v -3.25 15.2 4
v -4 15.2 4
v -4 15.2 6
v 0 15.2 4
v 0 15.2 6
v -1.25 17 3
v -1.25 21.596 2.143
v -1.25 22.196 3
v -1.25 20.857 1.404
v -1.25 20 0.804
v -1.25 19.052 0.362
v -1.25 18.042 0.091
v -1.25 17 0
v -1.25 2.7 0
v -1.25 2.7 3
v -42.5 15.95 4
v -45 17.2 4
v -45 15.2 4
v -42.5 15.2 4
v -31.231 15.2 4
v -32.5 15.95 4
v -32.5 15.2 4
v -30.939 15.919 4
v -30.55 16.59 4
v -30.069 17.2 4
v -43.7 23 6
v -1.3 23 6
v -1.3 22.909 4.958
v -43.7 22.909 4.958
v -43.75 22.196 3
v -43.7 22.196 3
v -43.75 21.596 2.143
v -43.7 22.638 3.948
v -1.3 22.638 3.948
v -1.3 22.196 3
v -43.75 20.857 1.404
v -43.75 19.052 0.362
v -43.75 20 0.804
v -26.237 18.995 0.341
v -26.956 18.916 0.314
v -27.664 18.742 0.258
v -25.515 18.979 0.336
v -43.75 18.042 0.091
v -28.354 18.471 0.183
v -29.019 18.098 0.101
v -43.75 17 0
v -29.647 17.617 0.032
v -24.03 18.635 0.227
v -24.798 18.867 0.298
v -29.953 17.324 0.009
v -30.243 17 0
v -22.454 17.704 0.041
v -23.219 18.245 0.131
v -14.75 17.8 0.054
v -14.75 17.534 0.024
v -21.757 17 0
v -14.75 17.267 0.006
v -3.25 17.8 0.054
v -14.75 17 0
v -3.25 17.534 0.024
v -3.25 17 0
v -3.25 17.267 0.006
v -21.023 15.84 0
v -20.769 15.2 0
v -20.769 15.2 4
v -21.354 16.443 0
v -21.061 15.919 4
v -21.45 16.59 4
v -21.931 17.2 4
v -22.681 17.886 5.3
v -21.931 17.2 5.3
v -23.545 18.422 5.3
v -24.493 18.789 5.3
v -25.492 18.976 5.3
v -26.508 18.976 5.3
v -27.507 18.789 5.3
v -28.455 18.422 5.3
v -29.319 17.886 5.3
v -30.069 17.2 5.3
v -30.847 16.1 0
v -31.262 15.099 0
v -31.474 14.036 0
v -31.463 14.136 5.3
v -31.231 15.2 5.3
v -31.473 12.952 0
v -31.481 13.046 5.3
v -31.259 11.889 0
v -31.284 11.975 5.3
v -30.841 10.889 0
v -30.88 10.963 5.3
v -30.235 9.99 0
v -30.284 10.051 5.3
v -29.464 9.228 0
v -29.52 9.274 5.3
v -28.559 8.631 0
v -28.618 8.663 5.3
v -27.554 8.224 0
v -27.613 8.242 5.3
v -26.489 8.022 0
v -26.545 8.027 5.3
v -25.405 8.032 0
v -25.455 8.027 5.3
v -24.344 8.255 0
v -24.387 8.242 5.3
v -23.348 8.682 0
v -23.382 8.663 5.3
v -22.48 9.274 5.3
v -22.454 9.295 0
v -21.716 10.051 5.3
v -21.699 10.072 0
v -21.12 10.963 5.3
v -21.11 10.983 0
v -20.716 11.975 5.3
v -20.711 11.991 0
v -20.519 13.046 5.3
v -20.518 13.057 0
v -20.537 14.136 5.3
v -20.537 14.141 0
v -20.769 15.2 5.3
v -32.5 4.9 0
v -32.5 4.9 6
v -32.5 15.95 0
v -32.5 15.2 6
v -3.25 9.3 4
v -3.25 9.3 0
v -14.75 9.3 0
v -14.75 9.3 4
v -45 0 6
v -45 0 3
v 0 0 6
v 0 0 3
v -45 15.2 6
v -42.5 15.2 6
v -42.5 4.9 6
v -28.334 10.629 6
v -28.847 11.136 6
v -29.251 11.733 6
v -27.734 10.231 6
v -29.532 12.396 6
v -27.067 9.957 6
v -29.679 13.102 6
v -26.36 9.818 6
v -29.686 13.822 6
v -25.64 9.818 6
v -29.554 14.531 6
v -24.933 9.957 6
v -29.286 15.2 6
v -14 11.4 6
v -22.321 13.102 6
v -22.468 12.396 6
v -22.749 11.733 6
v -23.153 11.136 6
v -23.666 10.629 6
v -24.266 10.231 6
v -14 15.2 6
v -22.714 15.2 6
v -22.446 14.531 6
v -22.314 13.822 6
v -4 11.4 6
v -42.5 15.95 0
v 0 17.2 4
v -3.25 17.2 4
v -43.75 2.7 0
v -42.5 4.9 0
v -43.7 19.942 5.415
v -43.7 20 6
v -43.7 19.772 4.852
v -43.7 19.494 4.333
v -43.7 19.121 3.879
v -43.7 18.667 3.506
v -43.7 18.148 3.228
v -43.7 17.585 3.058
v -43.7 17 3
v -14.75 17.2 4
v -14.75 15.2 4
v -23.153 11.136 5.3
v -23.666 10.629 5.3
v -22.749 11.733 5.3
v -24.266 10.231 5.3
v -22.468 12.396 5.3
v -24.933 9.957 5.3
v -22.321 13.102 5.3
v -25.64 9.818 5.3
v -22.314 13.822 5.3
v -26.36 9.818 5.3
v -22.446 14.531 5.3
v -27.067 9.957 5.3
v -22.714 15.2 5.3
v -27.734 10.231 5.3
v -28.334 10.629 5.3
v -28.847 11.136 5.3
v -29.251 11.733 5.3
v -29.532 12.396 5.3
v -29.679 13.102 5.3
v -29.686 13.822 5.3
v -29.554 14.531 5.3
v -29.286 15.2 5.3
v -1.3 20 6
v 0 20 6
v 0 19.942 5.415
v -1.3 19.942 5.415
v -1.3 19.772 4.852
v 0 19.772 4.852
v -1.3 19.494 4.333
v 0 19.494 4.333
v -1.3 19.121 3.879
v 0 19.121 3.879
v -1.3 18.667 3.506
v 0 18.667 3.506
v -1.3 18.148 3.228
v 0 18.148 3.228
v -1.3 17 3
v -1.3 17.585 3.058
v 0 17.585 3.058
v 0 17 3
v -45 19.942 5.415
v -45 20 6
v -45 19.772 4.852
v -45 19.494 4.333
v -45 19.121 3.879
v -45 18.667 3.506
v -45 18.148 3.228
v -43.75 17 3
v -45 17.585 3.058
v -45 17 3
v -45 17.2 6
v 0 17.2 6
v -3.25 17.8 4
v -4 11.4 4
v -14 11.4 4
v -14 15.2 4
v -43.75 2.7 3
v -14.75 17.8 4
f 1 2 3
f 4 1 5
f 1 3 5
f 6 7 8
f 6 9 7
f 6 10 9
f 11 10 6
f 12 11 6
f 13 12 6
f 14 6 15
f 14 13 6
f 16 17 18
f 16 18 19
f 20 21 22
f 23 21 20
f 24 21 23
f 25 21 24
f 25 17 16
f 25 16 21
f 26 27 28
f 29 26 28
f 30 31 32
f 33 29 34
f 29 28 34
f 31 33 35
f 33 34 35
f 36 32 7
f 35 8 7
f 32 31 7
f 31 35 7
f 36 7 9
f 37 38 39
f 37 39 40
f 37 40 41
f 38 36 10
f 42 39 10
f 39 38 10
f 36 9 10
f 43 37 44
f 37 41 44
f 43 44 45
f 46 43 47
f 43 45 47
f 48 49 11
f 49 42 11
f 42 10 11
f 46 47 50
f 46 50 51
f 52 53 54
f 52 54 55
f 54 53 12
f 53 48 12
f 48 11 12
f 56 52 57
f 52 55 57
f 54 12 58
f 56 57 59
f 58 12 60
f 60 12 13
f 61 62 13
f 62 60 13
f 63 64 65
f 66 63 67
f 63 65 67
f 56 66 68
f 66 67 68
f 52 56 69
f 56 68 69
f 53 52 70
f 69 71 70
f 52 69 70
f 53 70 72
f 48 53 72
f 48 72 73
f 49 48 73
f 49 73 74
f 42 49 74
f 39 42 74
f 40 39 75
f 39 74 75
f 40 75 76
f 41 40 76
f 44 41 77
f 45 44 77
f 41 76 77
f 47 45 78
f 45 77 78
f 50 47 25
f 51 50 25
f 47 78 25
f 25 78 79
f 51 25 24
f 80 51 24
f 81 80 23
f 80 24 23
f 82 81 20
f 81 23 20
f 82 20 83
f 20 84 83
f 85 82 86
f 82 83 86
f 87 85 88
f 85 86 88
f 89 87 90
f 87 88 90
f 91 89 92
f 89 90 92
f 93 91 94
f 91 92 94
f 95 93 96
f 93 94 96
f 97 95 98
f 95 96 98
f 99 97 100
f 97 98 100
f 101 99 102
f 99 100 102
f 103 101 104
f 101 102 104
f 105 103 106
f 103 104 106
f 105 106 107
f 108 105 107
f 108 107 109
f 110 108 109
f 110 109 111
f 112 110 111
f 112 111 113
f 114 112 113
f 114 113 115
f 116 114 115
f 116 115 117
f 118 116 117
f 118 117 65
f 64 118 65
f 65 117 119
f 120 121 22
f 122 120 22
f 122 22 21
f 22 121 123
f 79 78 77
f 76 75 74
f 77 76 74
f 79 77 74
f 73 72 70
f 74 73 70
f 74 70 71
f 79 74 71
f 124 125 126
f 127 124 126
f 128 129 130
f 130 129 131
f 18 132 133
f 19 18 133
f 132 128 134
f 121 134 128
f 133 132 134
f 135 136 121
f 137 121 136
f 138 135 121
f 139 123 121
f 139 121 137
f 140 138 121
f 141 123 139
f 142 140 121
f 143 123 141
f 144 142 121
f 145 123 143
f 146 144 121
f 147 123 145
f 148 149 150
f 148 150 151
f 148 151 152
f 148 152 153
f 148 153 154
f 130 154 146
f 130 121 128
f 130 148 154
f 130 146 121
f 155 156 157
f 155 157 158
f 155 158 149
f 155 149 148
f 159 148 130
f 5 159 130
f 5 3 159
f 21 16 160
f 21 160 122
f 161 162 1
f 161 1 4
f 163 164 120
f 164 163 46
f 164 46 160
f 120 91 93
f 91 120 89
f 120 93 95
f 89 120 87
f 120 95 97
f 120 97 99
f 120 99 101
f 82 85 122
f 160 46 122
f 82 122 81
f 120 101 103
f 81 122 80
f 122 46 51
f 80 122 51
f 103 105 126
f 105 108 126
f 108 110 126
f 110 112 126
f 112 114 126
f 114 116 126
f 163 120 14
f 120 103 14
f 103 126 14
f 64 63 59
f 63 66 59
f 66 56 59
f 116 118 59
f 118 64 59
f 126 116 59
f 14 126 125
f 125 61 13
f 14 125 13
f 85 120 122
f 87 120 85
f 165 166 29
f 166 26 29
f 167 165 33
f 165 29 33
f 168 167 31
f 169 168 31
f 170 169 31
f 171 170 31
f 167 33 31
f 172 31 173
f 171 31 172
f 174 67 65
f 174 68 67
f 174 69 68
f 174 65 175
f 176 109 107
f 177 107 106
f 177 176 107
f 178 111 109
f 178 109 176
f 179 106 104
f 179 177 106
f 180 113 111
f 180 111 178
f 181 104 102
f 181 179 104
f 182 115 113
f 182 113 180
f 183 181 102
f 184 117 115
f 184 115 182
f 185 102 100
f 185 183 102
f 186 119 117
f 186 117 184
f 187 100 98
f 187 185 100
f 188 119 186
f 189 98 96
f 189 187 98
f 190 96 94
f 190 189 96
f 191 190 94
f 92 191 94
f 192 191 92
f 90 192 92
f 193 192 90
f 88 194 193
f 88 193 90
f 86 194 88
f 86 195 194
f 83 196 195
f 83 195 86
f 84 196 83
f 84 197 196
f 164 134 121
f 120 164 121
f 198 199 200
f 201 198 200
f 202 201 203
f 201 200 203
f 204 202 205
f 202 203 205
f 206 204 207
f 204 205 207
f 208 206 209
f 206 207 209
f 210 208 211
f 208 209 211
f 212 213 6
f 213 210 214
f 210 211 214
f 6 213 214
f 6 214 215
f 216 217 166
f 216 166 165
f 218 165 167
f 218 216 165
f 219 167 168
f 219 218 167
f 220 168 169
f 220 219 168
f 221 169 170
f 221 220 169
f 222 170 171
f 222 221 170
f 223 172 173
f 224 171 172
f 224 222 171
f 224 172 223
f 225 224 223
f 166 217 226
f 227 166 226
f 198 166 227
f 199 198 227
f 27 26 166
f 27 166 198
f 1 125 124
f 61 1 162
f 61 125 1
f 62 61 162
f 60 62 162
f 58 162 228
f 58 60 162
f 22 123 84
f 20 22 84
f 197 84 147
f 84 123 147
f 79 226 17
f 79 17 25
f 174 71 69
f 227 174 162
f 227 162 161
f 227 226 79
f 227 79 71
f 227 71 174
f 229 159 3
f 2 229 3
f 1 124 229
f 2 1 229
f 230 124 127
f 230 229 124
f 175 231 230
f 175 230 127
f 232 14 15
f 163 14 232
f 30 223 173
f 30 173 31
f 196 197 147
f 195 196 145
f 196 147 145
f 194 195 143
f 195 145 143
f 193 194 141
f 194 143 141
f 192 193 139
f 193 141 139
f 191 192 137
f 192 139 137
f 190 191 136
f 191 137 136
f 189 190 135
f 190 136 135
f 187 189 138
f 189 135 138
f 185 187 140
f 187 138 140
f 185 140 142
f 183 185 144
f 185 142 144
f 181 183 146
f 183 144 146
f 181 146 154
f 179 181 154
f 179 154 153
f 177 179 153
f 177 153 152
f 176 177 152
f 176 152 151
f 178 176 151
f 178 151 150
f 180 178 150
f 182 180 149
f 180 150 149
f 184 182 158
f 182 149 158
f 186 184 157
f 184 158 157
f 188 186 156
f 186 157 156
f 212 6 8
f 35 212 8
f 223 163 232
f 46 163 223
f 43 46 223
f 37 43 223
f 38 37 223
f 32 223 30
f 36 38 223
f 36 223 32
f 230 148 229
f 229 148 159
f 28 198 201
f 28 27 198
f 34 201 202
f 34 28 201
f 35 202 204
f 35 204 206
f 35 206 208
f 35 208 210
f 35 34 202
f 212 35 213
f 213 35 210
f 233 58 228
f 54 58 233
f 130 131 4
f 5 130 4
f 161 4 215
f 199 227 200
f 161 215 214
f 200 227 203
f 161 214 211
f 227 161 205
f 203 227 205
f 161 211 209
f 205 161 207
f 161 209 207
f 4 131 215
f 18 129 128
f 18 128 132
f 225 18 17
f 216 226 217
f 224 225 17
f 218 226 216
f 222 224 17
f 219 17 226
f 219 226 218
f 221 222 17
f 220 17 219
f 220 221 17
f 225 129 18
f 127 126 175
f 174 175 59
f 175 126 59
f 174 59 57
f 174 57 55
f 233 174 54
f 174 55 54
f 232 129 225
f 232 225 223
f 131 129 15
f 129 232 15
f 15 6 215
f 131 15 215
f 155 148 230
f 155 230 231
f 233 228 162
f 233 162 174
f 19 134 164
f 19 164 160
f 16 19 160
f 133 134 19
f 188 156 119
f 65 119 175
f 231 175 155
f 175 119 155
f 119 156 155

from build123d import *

# Parameters (mm, degrees)
ESQUISSE1_W             = 45
ESQUISSE1_H             = 23
BOSS_EXTRU_1_DEPTH      = 6
ENL_V_MAT_EXTRU_1_DEPTH = 3
CONG_1_R                = 6
ENL_V_MAT_EXTRU_3_DEPTH = 1.3
ESQUISSE7_W             = 45
ESQUISSE7_H             = 2
ENL_V_MAT_EXTRU_4_DEPTH = 2
ESQUISSE8_R             = 5.5
ESQUISSE8_W             = 10
ESQUISSE8_H             = 11.05
ESQUISSE8_H_2           = 4.3
ENL_V_MAT_EXTRU_5_DEPTH = 51.8920426
ESQUISSE9_W             = 11.5
ESQUISSE9_H             = 8.5
ENL_V_MAT_EXTRU_6_DEPTH = 4
BOSS_EXTRU_2_DEPTH      = 0.7
ESQUISSE12_R            = 3.7
ENL_V_MAT_EXTRU_8_DEPTH = 1


with BuildPart() as part:
    # Esquisse1 → Boss.-Extru.1 (new body)
    with BuildSketch(Plane.XY):
        with Locations((-22.5, 11.5)):
            Rectangle(ESQUISSE1_W, ESQUISSE1_H)
    extrude(amount=BOSS_EXTRU_1_DEPTH)

    # Esquisse2 → Enlèv. mat.-Extru.1 (cut)
    with BuildSketch(Plane(origin=(0, 0, 0), x_dir=(-1, 0, 0), z_dir=(0, 0, -1))):
        Polygon((0, 23), (1.25, 23), (1.25, 2.7), (43.75, 2.7), (43.75, 23), (45, 23), (45, 0), (0, 0), align=None)
    extrude(amount=-ENL_V_MAT_EXTRU_1_DEPTH, mode=Mode.SUBTRACT)

    # Congé1
    cong_1_edges = [part.edges().sort_by_distance(p)[0] for p in [
        (-22.5, 23, 0),
    ]]
    fillet(cong_1_edges, radius=CONG_1_R - 0.0001)  # a hair under: the kernel refuses the full size

    # Esquisse6 → Enlèv. mat.-Extru.3 (cut)
    with BuildSketch(Plane(origin=(0, 0, 0), x_dir=(0, 0, -1), z_dir=(1, 0, 0))):
        with BuildLine():
            Line((-3, 17), (-3, 23.616482957))
            Line((-3, 23.616482957), (-6, 23.616482957))
            Line((-6, 23.616482957), (-6, 20))
            ThreePointArc((-6, 20), (-3.878679656, 19.121320344), (-3, 17))
        make_face()
    enl_v_mat_extru_3 = extrude(amount=-ENL_V_MAT_EXTRU_3_DEPTH, mode=Mode.SUBTRACT)

    # Symétrie2: Enlèv. mat.-Extru.3 across plane
    add(enl_v_mat_extru_3.mirror(Plane.ZY.offset(22.5)), mode=Mode.SUBTRACT)

    # Esquisse7 → Enlèv. mat.-Extru.4 (cut)
    with BuildSketch(Plane.XY.offset(6)):
        with Locations((-22.5, 16.2)):
            Rectangle(ESQUISSE7_W, ESQUISSE7_H)
    extrude(amount=-ENL_V_MAT_EXTRU_4_DEPTH, mode=Mode.SUBTRACT)

    # Esquisse8 → Enlèv. mat.-Extru.5 (cut, through all)
    with BuildSketch(Plane.XY.offset(6)):
        with Locations(Location((-26, 13.5, 0), (0, 0, 18.004453))):
            Circle(ESQUISSE8_R)
        with Locations((-37.5, 10.425)):
            Rectangle(ESQUISSE8_W, ESQUISSE8_H)
        with Locations((-9, 13.55)):
            Rectangle(ESQUISSE8_W, ESQUISSE8_H_2)
    extrude(amount=-ENL_V_MAT_EXTRU_5_DEPTH, mode=Mode.SUBTRACT)

    # Esquisse9 → Enlèv. mat.-Extru.6 (cut)
    with BuildSketch(Plane(origin=(0, 0, 0), x_dir=(-1, 0, 0), z_dir=(0, 0, -1))):
        with Locations((9, 13.55)):
            Rectangle(ESQUISSE9_W, ESQUISSE9_H)
    extrude(amount=-ENL_V_MAT_EXTRU_6_DEPTH, mode=Mode.SUBTRACT)

    # Esquisse10 → Boss.-Extru.2 (add)
    with BuildSketch(Plane.XY.offset(6)):
        with BuildLine():
            Line((-30.06939799, 17.2), (-21.93060201, 17.2))
            ThreePointArc((-21.93060201, 17.2), (-26, 19), (-30.06939799, 17.2))
        make_face()
        with BuildLine():
            Line((-31.230678732, 15.2), (-20.769321268, 15.2))
            ThreePointArc((-20.769321268, 15.2), (-26, 8), (-31.230678732, 15.2))
        make_face()
    extrude(amount=-BOSS_EXTRU_2_DEPTH)

    # Esquisse12 → Enlèv. mat.-Extru.8 (cut)
    with BuildSketch(Plane.XY.offset(6)):
        with Locations((-26, 13.5)):
            Circle(ESQUISSE12_R)
    extrude(amount=-ENL_V_MAT_EXTRU_8_DEPTH, mode=Mode.SUBTRACT)


solid = part.part
